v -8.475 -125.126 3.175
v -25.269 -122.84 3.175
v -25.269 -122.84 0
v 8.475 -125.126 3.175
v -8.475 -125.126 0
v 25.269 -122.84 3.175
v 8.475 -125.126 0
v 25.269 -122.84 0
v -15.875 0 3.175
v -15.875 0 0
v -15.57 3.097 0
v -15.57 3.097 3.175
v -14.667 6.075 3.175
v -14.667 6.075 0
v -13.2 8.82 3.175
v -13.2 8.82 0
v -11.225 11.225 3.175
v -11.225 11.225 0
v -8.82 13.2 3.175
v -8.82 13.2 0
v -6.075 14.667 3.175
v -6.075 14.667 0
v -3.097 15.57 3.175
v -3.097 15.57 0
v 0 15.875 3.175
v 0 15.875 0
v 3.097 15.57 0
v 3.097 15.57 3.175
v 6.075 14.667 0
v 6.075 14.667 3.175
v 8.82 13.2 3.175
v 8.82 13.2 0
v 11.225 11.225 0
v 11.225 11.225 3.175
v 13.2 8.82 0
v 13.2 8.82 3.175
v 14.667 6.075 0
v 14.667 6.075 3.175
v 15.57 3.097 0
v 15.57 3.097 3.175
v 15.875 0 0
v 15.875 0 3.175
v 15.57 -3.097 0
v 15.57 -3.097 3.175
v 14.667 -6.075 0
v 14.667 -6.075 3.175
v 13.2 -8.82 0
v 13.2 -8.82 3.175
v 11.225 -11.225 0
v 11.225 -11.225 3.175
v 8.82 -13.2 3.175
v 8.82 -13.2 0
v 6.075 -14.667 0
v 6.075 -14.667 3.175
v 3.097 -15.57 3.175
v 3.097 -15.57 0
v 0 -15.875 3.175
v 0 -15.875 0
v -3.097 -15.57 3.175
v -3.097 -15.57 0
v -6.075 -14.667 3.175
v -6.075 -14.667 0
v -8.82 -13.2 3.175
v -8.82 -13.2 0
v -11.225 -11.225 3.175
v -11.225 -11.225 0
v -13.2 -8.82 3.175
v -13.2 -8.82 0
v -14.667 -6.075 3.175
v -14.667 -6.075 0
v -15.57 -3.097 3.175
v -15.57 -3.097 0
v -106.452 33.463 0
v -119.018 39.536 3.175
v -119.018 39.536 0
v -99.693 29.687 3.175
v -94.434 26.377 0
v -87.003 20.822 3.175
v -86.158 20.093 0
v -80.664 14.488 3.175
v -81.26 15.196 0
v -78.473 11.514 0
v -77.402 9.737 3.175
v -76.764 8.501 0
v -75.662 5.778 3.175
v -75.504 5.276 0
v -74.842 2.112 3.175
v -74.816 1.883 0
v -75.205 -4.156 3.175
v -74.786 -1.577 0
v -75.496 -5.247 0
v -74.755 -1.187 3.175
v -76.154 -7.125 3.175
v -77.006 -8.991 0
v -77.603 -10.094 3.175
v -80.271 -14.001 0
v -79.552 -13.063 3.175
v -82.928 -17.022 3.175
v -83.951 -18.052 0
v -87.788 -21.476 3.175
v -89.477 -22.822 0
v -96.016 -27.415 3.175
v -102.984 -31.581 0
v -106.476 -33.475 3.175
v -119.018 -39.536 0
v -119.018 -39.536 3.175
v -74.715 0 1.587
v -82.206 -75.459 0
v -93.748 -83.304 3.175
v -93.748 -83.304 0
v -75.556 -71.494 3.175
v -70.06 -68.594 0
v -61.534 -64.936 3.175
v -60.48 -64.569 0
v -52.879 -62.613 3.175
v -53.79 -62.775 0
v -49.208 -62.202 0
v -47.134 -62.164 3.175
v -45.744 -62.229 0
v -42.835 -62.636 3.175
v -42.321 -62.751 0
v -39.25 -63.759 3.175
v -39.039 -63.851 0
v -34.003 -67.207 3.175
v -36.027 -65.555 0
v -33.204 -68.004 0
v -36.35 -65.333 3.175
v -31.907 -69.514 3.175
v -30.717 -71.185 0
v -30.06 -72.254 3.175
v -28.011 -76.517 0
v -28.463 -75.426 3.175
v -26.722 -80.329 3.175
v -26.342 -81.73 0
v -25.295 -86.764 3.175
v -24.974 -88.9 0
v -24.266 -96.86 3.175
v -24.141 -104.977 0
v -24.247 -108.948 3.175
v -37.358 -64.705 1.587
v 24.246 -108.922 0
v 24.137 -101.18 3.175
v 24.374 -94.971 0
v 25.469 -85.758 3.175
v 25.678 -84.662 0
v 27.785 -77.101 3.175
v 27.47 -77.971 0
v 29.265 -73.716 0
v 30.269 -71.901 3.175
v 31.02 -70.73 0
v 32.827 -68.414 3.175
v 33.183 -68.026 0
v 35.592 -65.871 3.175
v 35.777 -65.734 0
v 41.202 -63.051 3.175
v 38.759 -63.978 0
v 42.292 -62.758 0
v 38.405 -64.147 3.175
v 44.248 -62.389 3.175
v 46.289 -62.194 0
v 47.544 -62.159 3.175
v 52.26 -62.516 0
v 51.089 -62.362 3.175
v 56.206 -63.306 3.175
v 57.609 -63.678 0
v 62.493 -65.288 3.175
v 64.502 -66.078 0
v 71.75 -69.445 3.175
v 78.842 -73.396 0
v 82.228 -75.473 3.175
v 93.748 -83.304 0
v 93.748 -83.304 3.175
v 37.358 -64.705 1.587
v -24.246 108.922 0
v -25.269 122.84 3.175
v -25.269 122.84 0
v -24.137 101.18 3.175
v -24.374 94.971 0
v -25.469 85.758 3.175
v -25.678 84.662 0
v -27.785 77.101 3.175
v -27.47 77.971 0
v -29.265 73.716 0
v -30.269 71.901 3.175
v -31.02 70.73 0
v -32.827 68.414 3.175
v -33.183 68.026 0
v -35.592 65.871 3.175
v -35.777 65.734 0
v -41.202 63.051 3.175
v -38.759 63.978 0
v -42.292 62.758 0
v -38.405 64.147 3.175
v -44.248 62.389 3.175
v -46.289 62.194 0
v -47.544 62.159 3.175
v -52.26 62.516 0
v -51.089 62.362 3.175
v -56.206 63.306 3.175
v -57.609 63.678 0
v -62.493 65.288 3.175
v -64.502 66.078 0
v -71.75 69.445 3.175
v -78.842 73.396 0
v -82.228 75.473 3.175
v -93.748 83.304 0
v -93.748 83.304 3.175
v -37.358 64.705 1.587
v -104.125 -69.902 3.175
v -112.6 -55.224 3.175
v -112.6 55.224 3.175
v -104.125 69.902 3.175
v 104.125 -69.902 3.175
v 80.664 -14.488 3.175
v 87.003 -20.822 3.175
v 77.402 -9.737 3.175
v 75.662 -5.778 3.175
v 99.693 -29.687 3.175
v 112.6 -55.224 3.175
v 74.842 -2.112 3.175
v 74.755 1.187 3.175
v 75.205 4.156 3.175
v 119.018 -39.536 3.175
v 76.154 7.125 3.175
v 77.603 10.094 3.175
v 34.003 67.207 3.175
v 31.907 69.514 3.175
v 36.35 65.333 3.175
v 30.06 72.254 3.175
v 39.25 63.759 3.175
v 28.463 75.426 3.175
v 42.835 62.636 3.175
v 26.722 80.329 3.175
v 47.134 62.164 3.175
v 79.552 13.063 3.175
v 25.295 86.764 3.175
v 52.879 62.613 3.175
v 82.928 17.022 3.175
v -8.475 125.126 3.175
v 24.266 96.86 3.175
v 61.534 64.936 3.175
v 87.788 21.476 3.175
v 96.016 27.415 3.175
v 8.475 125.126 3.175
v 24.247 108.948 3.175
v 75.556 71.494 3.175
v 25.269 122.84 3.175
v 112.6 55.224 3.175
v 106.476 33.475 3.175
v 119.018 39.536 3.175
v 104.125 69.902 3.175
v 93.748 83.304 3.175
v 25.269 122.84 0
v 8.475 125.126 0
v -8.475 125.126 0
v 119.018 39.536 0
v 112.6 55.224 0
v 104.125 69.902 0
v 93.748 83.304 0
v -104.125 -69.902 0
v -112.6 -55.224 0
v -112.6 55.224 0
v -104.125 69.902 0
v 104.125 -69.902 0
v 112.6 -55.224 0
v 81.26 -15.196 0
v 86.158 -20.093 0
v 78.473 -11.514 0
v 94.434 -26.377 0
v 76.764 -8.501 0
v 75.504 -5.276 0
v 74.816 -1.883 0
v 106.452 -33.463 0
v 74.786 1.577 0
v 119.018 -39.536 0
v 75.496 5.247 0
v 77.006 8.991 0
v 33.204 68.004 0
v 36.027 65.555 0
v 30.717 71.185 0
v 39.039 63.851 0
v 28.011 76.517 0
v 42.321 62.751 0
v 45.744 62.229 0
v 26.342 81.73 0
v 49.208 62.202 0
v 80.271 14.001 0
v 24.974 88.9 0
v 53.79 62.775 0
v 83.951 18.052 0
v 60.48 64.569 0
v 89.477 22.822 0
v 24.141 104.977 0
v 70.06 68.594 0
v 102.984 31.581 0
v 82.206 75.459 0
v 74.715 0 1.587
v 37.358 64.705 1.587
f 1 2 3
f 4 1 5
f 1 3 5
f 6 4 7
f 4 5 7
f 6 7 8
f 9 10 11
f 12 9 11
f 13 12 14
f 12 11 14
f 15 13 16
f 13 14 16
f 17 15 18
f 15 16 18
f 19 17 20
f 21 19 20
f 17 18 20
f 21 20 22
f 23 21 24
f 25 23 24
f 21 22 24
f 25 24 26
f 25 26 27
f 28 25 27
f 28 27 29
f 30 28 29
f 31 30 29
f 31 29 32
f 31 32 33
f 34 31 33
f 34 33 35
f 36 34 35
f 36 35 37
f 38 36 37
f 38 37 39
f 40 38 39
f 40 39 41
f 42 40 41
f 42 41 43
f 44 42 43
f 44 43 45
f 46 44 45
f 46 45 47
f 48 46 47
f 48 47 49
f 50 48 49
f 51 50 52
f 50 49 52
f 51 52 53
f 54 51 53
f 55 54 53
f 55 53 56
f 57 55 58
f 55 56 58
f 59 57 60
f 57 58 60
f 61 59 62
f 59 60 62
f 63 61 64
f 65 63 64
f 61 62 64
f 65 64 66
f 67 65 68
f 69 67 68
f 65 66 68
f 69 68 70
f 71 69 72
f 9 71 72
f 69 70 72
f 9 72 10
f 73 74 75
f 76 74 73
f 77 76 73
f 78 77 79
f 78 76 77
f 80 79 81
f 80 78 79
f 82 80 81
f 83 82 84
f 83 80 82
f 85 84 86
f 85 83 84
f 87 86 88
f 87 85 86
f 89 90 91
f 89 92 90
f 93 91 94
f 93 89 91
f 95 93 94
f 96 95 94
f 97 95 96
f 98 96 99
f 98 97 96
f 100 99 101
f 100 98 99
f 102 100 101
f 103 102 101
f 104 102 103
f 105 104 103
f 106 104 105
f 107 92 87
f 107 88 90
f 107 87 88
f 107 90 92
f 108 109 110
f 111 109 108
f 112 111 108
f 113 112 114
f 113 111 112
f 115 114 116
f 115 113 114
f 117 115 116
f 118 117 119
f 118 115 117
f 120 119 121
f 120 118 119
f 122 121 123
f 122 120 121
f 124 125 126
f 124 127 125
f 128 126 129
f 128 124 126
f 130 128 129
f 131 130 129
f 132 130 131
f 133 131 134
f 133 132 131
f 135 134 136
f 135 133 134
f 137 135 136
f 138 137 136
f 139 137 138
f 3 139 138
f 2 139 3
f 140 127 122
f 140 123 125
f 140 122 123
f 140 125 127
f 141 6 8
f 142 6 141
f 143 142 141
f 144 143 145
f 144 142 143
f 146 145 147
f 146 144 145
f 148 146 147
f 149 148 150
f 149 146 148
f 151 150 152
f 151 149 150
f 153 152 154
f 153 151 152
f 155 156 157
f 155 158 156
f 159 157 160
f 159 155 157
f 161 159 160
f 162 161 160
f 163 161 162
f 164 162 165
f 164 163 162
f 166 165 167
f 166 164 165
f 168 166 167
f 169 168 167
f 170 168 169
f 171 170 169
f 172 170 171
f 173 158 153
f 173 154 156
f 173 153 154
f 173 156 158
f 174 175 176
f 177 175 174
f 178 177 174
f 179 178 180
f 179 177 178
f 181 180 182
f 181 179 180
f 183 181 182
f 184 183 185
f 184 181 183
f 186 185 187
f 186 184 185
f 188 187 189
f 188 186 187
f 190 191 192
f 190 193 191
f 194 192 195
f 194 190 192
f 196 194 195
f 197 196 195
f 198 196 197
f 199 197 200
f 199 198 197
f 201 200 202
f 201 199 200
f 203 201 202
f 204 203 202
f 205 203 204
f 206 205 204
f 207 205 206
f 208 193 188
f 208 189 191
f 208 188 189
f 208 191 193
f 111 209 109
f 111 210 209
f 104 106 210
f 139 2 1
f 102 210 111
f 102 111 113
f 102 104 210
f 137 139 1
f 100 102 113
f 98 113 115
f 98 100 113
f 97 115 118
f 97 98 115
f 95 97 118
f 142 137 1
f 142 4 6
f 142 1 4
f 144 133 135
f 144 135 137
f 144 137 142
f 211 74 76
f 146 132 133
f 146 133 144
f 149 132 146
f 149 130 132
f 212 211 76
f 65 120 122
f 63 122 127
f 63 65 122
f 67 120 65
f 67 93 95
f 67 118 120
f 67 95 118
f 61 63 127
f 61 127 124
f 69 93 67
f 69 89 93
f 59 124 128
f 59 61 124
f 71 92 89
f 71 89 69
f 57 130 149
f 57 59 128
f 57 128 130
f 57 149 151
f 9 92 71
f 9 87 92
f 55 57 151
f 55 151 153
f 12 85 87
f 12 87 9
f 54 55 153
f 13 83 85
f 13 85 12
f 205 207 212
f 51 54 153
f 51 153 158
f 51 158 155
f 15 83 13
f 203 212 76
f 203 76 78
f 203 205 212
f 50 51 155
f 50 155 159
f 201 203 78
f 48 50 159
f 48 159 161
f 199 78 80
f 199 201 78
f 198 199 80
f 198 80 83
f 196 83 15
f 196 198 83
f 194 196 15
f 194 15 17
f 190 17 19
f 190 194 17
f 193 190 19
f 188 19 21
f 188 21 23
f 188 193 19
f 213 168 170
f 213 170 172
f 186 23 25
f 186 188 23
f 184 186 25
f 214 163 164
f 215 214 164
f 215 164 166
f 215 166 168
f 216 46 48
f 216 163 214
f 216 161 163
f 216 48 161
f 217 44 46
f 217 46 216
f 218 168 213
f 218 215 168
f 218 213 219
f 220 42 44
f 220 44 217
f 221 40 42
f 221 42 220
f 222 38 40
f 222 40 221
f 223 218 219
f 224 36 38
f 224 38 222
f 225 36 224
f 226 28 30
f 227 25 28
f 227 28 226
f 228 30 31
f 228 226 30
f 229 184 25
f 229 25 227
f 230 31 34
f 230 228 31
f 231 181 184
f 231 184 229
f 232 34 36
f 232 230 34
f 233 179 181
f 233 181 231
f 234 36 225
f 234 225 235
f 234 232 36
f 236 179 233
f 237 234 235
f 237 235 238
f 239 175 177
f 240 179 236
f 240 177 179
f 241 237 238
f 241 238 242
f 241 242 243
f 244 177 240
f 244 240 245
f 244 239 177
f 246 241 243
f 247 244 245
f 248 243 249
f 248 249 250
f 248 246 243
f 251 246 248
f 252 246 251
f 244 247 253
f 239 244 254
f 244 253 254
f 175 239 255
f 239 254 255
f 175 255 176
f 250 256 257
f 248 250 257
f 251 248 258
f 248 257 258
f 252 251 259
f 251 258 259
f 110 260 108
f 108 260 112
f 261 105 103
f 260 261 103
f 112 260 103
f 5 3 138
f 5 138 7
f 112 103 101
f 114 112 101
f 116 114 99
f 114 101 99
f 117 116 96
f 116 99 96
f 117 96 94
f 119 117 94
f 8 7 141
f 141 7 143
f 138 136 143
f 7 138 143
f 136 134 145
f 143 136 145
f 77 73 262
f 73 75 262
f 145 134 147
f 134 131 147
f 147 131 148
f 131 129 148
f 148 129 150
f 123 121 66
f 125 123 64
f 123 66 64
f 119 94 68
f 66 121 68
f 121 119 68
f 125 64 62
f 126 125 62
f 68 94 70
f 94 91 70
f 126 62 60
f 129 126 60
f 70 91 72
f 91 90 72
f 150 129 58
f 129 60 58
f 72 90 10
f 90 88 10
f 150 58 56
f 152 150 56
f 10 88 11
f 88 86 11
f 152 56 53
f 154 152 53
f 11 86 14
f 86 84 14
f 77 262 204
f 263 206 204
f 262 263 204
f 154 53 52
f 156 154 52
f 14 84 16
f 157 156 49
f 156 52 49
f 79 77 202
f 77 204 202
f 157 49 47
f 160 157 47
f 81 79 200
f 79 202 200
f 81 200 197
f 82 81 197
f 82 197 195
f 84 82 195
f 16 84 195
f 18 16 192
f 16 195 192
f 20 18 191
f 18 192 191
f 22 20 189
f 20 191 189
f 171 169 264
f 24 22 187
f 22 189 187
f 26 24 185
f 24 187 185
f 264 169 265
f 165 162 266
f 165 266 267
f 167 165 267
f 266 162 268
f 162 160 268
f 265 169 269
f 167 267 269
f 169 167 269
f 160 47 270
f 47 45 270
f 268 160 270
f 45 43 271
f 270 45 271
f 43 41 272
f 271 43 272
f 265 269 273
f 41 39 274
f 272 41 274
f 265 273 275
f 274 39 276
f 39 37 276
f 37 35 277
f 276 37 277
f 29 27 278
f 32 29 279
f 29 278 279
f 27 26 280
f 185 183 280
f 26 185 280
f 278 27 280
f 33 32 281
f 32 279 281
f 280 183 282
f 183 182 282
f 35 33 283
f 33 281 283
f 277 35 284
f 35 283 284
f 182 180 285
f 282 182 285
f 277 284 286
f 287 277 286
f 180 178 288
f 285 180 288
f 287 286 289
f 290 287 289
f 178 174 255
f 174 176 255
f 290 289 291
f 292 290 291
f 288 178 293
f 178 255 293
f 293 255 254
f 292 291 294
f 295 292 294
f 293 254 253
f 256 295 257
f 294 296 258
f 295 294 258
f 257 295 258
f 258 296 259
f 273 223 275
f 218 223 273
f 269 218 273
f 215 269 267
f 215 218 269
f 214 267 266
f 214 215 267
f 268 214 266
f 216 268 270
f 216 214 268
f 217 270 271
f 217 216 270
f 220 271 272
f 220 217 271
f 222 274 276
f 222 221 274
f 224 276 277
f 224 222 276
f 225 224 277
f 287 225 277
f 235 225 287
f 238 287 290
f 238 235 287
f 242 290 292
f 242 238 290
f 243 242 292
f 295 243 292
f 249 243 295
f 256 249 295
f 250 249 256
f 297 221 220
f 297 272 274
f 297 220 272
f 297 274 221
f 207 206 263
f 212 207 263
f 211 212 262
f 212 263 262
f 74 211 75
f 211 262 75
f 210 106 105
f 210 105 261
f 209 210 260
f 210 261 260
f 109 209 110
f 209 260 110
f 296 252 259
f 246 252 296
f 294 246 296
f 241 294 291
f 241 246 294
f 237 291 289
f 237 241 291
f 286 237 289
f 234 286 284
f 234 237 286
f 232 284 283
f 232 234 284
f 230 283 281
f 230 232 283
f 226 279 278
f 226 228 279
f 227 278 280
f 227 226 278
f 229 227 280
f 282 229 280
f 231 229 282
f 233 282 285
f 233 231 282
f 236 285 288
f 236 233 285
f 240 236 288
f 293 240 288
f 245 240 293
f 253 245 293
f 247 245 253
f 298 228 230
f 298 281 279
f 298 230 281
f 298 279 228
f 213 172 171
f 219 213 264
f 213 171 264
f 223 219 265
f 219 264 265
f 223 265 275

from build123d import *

# Parameters (mm, degrees)
SKETCH1_R           = 125.4125
BOSS_EXTRUDE1_DEPTH = 3.175
CUT_EXTRUDE1_DEPTH  = 4.175
CIRPATTERN1_COUNT   = 6
SKETCH3_R           = 15.875
CUT_EXTRUDE2_DEPTH  = 50.8


with BuildPart() as part:
    # Sketch1 → Boss-Extrude1 (new body)
    with BuildSketch(Plane.XY):
        Circle(SKETCH1_R)
    extrude(amount=BOSS_EXTRUDE1_DEPTH)

    # Sketch2 → Cut-Extrude1 (cut, through all)
    with BuildSketch(Plane.XY.offset(3.175)):
        with BuildLine():
            ThreePointArc((93.748147638, 83.304141377), (62.70625, 108.610410952), (25.269428854, 122.840348101))
            add(Edge.make_bspline(
                [(93.748147638, 83.304141377), (15.206576878, 26.338563761), (25.269428854, 122.840348101)],
                knots=[0, 0, 0, 1, 1, 1], degree=2))
        make_face()
    cut_extrude1 = extrude(amount=-CUT_EXTRUDE1_DEPTH, mode=Mode.SUBTRACT)

    # CirPattern1: Cut-Extrude1 ×6 about axis
    cirpattern1_axis = Axis((0, 0, 3.175), (0, 0, -1))
    for i in range(1, CIRPATTERN1_COUNT):
        add(cut_extrude1.rotate(cirpattern1_axis, i * 360 / CIRPATTERN1_COUNT), mode=Mode.SUBTRACT)

    # Sketch3 → Cut-Extrude2 (cut)
    with BuildSketch(Plane(origin=(0, 0, 0), x_dir=(-1, 0, 0), z_dir=(0, 0, -1))):
        Circle(SKETCH3_R)
    extrude(amount=-CUT_EXTRUDE2_DEPTH, mode=Mode.SUBTRACT)


solid = part.part
